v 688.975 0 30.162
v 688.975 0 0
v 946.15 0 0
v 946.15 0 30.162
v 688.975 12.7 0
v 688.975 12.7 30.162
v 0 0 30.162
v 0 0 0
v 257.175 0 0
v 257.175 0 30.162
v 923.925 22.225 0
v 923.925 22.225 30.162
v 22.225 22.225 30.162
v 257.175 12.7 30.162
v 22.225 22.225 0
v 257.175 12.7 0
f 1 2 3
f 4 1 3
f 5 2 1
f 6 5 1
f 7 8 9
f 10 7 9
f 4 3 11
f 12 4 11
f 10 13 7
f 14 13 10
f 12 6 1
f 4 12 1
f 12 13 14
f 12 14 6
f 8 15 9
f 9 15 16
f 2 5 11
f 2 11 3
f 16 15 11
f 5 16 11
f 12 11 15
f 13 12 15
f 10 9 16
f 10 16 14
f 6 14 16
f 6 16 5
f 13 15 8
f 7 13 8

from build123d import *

# Parameters (mm, degrees)
F1_DEPTH = 30.1625
F2_W     = 431.8
F2_H     = 30.1625
F3_DEPTH = 12.7


with BuildPart() as f1:
    # F0 (on Top) → F1 (new body)
    with BuildSketch(Plane.XY):
        Polygon((22.225, 22.225), (0, 0), (946.15, 0), (923.925, 22.225), align=None)
    extrude(amount=F1_DEPTH)

    # F2 (on face) → F3 (cut)
    with BuildSketch(Plane.XZ):
        with Locations((473.075, 15.08125)):
            Rectangle(F2_W, F2_H)
    extrude(amount=-F3_DEPTH, mode=Mode.SUBTRACT)


solid = f1.part
